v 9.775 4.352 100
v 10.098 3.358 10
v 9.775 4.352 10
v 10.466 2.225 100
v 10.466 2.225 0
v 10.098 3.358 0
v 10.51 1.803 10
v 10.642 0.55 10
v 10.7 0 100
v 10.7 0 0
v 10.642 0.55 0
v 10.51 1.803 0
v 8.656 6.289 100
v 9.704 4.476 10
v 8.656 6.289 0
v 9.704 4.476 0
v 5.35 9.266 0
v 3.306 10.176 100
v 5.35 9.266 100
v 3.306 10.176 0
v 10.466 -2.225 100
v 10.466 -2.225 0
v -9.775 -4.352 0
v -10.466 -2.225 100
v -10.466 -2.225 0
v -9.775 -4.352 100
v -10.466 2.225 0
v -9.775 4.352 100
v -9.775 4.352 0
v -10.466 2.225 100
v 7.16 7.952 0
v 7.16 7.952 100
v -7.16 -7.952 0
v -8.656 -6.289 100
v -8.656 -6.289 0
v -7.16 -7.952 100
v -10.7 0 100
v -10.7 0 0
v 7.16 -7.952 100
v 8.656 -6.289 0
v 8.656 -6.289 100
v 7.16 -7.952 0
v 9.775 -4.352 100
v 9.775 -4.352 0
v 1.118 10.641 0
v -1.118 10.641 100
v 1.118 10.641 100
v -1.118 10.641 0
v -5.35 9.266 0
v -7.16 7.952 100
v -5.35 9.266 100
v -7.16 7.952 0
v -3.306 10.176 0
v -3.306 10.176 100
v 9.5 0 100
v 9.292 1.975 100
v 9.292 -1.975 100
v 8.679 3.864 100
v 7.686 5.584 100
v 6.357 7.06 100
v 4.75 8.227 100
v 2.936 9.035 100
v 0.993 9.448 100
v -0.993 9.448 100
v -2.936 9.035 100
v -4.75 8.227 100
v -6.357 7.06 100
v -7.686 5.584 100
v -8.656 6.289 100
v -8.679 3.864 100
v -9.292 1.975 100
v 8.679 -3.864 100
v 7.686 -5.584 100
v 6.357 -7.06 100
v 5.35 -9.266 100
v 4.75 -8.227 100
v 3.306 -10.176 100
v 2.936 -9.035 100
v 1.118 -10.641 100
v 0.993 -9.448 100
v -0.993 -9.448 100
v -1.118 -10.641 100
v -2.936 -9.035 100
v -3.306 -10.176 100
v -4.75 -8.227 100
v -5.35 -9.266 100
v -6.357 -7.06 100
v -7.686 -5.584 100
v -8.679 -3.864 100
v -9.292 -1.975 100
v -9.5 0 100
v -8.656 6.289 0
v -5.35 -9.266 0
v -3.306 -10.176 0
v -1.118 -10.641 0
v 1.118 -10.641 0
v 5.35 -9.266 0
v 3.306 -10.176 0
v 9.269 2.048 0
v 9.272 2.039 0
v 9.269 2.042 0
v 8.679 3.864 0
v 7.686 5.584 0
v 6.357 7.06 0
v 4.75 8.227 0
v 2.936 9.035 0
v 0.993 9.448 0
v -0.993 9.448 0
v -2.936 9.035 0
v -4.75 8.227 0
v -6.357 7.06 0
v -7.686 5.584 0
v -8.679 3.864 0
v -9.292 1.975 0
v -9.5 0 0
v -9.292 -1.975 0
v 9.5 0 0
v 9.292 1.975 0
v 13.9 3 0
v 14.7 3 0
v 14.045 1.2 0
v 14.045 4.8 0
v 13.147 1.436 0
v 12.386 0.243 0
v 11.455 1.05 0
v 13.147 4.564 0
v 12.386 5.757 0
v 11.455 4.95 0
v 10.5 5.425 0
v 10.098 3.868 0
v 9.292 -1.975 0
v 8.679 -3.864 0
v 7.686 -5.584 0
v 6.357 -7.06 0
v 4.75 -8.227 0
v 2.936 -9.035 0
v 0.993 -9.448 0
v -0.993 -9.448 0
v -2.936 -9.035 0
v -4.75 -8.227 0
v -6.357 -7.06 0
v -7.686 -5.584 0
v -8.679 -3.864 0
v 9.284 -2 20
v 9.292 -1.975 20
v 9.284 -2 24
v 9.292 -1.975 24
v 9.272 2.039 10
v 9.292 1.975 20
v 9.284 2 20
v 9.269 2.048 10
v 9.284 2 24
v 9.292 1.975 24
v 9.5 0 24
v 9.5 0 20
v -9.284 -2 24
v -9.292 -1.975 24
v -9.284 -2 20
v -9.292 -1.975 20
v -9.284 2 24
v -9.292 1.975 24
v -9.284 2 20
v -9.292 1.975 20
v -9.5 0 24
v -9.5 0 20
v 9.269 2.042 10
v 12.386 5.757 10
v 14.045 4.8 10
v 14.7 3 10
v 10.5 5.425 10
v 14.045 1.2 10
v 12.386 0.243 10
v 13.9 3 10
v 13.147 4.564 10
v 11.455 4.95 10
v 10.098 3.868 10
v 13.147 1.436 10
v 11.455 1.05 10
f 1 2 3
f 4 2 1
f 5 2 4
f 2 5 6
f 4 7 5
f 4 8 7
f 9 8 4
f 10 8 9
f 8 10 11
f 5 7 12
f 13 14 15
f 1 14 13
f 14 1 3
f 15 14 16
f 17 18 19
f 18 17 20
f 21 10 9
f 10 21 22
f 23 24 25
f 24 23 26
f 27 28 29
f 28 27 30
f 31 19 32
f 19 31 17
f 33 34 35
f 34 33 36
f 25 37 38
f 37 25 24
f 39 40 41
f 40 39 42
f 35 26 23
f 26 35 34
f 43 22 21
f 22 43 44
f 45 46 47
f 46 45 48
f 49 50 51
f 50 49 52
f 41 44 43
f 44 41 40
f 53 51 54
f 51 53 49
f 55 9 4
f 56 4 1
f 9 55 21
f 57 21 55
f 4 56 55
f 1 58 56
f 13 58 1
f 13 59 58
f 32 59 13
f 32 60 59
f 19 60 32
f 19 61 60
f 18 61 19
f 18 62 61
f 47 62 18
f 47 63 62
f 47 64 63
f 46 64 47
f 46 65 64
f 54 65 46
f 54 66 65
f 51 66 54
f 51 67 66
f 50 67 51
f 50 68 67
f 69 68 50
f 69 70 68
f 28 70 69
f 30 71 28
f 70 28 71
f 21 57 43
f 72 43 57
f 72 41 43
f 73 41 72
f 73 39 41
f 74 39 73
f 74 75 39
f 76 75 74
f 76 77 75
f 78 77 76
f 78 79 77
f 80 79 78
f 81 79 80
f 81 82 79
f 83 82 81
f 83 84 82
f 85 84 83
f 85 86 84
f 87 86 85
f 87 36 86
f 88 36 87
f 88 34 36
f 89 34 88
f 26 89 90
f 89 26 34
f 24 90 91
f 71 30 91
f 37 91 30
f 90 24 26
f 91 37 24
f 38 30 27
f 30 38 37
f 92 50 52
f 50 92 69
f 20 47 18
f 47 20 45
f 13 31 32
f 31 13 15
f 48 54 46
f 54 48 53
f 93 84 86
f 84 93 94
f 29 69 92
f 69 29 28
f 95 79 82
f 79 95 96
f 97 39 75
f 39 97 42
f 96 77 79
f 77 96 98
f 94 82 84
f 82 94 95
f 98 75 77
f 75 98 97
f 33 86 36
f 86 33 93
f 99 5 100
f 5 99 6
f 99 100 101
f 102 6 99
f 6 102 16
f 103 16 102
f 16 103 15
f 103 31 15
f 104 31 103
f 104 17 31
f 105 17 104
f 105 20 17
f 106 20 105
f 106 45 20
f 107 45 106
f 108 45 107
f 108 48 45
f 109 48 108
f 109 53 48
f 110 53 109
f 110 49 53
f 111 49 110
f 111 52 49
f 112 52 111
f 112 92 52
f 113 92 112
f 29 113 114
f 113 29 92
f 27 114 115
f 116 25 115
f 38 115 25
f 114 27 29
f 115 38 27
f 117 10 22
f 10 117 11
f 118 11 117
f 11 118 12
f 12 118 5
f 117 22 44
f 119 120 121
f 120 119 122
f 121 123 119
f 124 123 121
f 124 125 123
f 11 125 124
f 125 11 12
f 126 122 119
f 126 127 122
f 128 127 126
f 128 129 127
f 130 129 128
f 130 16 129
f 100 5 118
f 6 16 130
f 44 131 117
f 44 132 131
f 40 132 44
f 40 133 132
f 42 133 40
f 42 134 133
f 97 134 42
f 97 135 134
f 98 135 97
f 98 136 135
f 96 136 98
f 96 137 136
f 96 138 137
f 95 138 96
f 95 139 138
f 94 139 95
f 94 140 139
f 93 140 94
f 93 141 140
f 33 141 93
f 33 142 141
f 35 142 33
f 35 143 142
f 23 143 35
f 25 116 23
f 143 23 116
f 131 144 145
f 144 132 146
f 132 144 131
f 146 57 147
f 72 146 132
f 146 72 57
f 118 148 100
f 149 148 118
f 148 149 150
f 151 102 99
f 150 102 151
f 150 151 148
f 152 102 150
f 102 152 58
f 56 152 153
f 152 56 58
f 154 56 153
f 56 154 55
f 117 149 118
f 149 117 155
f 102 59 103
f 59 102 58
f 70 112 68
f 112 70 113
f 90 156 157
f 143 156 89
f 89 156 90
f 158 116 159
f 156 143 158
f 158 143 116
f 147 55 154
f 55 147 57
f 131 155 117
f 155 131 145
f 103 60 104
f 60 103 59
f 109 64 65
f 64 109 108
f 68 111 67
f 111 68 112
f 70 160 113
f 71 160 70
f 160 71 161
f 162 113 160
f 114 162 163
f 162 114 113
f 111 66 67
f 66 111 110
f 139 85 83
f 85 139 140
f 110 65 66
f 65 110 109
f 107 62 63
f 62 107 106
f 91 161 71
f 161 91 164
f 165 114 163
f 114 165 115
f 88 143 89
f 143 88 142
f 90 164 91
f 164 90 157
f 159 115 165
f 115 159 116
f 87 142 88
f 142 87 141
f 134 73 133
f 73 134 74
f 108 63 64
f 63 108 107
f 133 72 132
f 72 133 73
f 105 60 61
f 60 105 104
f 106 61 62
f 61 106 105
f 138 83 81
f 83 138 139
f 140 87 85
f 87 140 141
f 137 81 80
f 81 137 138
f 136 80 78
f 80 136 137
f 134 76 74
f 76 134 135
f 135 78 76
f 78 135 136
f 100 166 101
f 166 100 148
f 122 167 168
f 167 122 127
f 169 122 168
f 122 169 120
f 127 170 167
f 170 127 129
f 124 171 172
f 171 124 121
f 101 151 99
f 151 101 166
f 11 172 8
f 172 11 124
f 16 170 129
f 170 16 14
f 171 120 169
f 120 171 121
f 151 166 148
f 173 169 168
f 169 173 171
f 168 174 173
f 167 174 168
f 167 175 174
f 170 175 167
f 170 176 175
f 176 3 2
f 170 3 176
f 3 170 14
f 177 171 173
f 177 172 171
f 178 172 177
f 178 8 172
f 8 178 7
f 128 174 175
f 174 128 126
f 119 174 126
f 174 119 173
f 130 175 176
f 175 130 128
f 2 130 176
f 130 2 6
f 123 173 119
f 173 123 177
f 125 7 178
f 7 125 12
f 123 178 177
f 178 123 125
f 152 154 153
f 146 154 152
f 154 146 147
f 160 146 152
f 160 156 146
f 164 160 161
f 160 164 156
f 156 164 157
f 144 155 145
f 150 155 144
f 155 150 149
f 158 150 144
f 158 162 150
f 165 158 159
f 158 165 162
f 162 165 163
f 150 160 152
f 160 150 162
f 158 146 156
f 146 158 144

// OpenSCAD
a=100; b=10.7;
module stupen () {
    difference () {
    cylinder(a,b,b);
    translate ([0,0,-1]) cylinder (a+2,b-1.2,b-1.2);
}};

module uchyt () {
    difference () {
    translate ([11.9,3,0]) cylinder (10,2.8,2.8);
    translate ([11.9,3,-1]) cylinder (12,2,2);
}}

module prepazka () {
    translate ([-9.5,-2,20]) cube ([19,4,4]);
}

union () {
    stupen ();
    uchyt ();
    prepazka ();
}
